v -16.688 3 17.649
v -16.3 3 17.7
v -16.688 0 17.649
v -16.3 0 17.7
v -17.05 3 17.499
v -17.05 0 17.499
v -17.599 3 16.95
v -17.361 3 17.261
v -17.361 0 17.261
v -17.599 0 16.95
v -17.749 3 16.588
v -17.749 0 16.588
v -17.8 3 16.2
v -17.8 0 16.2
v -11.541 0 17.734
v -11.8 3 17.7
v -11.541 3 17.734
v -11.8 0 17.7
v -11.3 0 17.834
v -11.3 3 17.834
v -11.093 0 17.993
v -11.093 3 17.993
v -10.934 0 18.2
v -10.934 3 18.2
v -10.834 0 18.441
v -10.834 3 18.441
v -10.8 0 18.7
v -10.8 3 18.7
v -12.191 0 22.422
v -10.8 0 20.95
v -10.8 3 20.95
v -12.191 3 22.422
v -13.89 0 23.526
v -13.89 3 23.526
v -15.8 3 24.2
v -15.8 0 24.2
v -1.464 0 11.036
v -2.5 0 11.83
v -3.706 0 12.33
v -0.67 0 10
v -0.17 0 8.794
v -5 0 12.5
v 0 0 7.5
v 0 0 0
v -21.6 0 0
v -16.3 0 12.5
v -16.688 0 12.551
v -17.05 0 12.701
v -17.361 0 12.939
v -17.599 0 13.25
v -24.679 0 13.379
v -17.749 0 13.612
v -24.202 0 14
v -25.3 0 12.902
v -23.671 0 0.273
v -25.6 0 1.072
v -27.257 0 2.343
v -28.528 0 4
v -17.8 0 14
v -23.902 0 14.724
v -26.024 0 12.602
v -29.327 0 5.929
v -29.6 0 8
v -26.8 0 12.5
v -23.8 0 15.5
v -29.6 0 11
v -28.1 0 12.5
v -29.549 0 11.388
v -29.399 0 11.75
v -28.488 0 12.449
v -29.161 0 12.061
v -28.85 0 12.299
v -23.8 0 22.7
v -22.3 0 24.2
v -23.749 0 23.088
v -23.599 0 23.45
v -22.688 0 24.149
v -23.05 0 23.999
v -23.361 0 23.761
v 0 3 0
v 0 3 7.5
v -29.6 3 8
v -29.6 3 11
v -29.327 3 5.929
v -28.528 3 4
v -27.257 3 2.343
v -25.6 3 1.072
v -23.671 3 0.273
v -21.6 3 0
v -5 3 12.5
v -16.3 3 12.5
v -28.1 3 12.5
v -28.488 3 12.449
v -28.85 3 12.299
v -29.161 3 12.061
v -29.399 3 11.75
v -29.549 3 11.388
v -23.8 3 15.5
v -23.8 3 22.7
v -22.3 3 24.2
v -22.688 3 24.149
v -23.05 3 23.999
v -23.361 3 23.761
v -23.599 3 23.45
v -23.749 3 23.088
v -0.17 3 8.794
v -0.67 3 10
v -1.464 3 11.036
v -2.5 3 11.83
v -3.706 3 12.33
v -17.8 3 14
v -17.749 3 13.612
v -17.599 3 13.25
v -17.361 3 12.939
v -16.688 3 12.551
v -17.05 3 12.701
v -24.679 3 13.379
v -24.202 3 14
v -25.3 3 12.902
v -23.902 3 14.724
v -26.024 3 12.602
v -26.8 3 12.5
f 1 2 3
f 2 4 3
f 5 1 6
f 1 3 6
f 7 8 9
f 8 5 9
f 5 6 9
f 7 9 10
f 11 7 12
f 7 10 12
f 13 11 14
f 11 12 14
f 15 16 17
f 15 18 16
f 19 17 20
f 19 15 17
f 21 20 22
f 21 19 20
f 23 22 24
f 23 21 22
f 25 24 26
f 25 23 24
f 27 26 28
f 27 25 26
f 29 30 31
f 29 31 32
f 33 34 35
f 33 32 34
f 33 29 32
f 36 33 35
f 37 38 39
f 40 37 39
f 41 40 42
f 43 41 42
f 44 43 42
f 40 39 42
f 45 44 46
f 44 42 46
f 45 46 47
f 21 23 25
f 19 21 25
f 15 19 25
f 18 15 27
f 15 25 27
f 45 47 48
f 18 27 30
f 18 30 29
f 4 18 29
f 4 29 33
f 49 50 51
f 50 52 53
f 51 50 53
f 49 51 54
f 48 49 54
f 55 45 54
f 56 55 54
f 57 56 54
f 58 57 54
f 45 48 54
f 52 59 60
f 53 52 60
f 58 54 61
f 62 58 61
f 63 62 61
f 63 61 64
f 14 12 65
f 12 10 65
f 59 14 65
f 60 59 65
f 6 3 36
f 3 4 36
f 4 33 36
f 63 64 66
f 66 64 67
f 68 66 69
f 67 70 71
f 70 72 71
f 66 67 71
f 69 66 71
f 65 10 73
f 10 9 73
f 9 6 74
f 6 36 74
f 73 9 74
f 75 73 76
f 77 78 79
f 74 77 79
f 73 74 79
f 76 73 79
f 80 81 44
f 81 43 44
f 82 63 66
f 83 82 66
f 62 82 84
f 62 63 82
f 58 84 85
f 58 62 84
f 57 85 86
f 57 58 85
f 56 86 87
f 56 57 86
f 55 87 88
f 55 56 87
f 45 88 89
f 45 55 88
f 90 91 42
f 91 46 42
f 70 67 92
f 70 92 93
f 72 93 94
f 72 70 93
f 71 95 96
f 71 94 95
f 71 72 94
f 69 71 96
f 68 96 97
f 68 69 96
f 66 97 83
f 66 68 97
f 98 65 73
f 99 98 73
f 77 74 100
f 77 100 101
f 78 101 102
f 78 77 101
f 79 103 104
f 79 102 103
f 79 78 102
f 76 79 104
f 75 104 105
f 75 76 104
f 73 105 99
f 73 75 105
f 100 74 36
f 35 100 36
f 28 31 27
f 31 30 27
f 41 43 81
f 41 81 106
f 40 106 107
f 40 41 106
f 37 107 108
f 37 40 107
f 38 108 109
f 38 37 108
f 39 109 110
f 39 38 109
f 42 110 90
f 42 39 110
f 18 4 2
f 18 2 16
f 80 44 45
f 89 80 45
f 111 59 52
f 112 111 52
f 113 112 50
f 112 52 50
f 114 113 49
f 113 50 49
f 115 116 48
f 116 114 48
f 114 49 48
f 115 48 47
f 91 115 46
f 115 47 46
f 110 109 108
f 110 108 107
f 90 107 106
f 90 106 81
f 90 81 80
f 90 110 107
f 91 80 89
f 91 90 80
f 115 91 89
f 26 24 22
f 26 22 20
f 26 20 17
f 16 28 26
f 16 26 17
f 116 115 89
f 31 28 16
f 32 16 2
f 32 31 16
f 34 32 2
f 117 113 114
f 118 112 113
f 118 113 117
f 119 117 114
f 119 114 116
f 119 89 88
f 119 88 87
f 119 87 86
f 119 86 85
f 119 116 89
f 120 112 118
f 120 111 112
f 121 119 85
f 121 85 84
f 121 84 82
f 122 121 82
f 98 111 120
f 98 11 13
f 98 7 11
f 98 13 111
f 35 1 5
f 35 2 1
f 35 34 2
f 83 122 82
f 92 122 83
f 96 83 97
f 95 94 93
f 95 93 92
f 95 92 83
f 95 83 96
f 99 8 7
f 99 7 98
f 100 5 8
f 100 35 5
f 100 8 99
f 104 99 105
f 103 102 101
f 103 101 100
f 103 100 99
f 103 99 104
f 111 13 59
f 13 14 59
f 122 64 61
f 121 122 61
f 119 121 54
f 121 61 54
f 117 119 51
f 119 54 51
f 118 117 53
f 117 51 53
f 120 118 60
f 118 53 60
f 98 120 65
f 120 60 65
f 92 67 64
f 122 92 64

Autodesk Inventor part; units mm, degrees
ref_plane "YZ Plane" through (0, 0, 0) normal (1, 0, 0) x (0, 1, 0)
ref_plane "XZ Plane" through (0, 0, 0) normal (0, 1, 0) x (-1, 0, 0)
ref_plane "XY Plane" through (0, 0, 0) normal (0, 0, 1) x (1, 0, 0)
sketch "Sketch1" plane through (0, 0, 0) normal (0, 1, 0) x (-1, 0, 0)
  line L0 (0, 0) -> (29.6, 0)
  line L1 (29.6, 0) -> (29.6, 24.2)
  line L2 (29.6, 24.2) -> (0, 24.2)
  line L3 (0, 24.2) -> (0, 0)
  line L4 (29.6, 12.5) -> (0, 12.5)
  line L5 (0, 12.5) -> (0, 0)
  line L6 (0, 0) -> (29.6, 0)
  line L7 (29.6, 0) -> (29.6, 12.5)
  line L8 (23.8, 24.2) -> (10.8, 24.2)
  line L9 (10.8, 24.2) -> (10.8, 12.5)
  line L10 (10.8, 12.5) -> (23.8, 12.5)
  line L11 (23.8, 12.5) -> (23.8, 24.2)
  line L12 (23.8, 17.7) -> (17.8, 17.7)
  line L13 (17.8, 17.7) -> (17.8, 12.5)
  line L14 (17.8, 12.5) -> (23.8, 12.5)
  line L15 (23.8, 12.5) -> (23.8, 17.7)
  line L16 (17.8, 17.7) -> (10.8, 17.7)
  line L17 (10.8, 17.7) -> (10.8, 12.5)
  line L18 (10.8, 12.5) -> (17.8, 12.5)
  line L19 (17.8, 12.5) -> (17.8, 17.7)
  circle A0 centre (21.6, 8) radius 8
  circle A1 centre (5, 7.5) radius 5
  circle A2 centre (16.3, 14) radius 1.5
  circle A3 centre (16.3, 16.2) radius 1.5
  circle A4 centre (26.8, 15.5) radius 3
  circle A5 centre (22.3, 22.7) radius 1.5
  circle A6 centre (11.8, 18.7) radius 1
  line L20 (10.8, 24.2) -> (15.8, 24.2)
  line L21 (15.8, 24.2) -> (15.8, 20.95)
  line L22 (15.8, 20.95) -> (10.8, 20.95)
  line L23 (10.8, 20.95) -> (10.8, 24.2)
  arc A7 (15.8, 24.2) -> (10.8, 20.95) centre (17.6697, 15.8525) ccw
  circle A8 centre (28.1, 11) radius 1.5
  point P0 (17.8, 14)
  point P1 (16.3, 12.5)
  point P2 (5, 12.5)
  point P3 (0, 7.5)
  point P4 (21.6, 0)
  point P5 (29.6, 8)
  point P6 (26.8, 12.5)
  point P7 (23.8, 15.5)
  point P8 (23.8, 22.7)
  point P9 (22.3, 24.2)
  point P10 (10.8, 18.7)
  point P11 (11.8, 17.7)
  point P12 (16.3, 17.7)
  point P13 (17.8, 16.2)
  point P14 (29.6, 11)
  point P15 (28.1, 12.5)
  dimension "d0" = 24.2
  dimension "d1" = 29.6
  dimension "d2" = 11.7
  dimension "d3" = 5.8
  dimension "d4" = 13
  dimension "d5" = 6.5
  dimension "d6" = 6
  dimension "d7" = 16
  dimension "d8" = 8
  dimension "d9" = 8
  dimension "d10" = 10
  dimension "d11" = 5
  dimension "d12" = 5
  dimension "d13" = 3
  dimension "d14" = 3
  dimension "d15" = 1.5
  dimension "d16" = 1.5
  dimension "d17" = 1.5
  dimension "d18" = 1.5
  dimension "d19" = 6
  dimension "d20" = 3
  dimension "d21" = 3
  dimension "d23" = 1.5
  dimension "d24" = 1.5
  dimension "d25" = 2
  dimension "d26" = 1
  dimension "d27" = 1
  dimension "d28" = 5
  dimension "d29" = 3.25
  dimension "d32" = 3
  dimension "d33" = 1.5
  dimension "d34" = 1.5
  dimension "d35" = 12.5
  dimension "d36" = 3
extrude "Extrusion1" add sketch "Sketch1" along normal blind 3 contours L3 A1 L4 A0 L0 | A0 L4 A8 | A1 | A0 A8 L1 | A2 L13 L4 | A8 A0 | A8 A0 | L13 A0 L11 L4 | L11 A4 L4 | L13 L12 L11 A0 | L9 L22 L21 L2 A5 L11 L12 L16 A6 | A6 | L16 L13 A3 | L21 L22 A7 | A5 picked at (19.8309, 8.6369)
properties part number "Pi_mount_newupper"
